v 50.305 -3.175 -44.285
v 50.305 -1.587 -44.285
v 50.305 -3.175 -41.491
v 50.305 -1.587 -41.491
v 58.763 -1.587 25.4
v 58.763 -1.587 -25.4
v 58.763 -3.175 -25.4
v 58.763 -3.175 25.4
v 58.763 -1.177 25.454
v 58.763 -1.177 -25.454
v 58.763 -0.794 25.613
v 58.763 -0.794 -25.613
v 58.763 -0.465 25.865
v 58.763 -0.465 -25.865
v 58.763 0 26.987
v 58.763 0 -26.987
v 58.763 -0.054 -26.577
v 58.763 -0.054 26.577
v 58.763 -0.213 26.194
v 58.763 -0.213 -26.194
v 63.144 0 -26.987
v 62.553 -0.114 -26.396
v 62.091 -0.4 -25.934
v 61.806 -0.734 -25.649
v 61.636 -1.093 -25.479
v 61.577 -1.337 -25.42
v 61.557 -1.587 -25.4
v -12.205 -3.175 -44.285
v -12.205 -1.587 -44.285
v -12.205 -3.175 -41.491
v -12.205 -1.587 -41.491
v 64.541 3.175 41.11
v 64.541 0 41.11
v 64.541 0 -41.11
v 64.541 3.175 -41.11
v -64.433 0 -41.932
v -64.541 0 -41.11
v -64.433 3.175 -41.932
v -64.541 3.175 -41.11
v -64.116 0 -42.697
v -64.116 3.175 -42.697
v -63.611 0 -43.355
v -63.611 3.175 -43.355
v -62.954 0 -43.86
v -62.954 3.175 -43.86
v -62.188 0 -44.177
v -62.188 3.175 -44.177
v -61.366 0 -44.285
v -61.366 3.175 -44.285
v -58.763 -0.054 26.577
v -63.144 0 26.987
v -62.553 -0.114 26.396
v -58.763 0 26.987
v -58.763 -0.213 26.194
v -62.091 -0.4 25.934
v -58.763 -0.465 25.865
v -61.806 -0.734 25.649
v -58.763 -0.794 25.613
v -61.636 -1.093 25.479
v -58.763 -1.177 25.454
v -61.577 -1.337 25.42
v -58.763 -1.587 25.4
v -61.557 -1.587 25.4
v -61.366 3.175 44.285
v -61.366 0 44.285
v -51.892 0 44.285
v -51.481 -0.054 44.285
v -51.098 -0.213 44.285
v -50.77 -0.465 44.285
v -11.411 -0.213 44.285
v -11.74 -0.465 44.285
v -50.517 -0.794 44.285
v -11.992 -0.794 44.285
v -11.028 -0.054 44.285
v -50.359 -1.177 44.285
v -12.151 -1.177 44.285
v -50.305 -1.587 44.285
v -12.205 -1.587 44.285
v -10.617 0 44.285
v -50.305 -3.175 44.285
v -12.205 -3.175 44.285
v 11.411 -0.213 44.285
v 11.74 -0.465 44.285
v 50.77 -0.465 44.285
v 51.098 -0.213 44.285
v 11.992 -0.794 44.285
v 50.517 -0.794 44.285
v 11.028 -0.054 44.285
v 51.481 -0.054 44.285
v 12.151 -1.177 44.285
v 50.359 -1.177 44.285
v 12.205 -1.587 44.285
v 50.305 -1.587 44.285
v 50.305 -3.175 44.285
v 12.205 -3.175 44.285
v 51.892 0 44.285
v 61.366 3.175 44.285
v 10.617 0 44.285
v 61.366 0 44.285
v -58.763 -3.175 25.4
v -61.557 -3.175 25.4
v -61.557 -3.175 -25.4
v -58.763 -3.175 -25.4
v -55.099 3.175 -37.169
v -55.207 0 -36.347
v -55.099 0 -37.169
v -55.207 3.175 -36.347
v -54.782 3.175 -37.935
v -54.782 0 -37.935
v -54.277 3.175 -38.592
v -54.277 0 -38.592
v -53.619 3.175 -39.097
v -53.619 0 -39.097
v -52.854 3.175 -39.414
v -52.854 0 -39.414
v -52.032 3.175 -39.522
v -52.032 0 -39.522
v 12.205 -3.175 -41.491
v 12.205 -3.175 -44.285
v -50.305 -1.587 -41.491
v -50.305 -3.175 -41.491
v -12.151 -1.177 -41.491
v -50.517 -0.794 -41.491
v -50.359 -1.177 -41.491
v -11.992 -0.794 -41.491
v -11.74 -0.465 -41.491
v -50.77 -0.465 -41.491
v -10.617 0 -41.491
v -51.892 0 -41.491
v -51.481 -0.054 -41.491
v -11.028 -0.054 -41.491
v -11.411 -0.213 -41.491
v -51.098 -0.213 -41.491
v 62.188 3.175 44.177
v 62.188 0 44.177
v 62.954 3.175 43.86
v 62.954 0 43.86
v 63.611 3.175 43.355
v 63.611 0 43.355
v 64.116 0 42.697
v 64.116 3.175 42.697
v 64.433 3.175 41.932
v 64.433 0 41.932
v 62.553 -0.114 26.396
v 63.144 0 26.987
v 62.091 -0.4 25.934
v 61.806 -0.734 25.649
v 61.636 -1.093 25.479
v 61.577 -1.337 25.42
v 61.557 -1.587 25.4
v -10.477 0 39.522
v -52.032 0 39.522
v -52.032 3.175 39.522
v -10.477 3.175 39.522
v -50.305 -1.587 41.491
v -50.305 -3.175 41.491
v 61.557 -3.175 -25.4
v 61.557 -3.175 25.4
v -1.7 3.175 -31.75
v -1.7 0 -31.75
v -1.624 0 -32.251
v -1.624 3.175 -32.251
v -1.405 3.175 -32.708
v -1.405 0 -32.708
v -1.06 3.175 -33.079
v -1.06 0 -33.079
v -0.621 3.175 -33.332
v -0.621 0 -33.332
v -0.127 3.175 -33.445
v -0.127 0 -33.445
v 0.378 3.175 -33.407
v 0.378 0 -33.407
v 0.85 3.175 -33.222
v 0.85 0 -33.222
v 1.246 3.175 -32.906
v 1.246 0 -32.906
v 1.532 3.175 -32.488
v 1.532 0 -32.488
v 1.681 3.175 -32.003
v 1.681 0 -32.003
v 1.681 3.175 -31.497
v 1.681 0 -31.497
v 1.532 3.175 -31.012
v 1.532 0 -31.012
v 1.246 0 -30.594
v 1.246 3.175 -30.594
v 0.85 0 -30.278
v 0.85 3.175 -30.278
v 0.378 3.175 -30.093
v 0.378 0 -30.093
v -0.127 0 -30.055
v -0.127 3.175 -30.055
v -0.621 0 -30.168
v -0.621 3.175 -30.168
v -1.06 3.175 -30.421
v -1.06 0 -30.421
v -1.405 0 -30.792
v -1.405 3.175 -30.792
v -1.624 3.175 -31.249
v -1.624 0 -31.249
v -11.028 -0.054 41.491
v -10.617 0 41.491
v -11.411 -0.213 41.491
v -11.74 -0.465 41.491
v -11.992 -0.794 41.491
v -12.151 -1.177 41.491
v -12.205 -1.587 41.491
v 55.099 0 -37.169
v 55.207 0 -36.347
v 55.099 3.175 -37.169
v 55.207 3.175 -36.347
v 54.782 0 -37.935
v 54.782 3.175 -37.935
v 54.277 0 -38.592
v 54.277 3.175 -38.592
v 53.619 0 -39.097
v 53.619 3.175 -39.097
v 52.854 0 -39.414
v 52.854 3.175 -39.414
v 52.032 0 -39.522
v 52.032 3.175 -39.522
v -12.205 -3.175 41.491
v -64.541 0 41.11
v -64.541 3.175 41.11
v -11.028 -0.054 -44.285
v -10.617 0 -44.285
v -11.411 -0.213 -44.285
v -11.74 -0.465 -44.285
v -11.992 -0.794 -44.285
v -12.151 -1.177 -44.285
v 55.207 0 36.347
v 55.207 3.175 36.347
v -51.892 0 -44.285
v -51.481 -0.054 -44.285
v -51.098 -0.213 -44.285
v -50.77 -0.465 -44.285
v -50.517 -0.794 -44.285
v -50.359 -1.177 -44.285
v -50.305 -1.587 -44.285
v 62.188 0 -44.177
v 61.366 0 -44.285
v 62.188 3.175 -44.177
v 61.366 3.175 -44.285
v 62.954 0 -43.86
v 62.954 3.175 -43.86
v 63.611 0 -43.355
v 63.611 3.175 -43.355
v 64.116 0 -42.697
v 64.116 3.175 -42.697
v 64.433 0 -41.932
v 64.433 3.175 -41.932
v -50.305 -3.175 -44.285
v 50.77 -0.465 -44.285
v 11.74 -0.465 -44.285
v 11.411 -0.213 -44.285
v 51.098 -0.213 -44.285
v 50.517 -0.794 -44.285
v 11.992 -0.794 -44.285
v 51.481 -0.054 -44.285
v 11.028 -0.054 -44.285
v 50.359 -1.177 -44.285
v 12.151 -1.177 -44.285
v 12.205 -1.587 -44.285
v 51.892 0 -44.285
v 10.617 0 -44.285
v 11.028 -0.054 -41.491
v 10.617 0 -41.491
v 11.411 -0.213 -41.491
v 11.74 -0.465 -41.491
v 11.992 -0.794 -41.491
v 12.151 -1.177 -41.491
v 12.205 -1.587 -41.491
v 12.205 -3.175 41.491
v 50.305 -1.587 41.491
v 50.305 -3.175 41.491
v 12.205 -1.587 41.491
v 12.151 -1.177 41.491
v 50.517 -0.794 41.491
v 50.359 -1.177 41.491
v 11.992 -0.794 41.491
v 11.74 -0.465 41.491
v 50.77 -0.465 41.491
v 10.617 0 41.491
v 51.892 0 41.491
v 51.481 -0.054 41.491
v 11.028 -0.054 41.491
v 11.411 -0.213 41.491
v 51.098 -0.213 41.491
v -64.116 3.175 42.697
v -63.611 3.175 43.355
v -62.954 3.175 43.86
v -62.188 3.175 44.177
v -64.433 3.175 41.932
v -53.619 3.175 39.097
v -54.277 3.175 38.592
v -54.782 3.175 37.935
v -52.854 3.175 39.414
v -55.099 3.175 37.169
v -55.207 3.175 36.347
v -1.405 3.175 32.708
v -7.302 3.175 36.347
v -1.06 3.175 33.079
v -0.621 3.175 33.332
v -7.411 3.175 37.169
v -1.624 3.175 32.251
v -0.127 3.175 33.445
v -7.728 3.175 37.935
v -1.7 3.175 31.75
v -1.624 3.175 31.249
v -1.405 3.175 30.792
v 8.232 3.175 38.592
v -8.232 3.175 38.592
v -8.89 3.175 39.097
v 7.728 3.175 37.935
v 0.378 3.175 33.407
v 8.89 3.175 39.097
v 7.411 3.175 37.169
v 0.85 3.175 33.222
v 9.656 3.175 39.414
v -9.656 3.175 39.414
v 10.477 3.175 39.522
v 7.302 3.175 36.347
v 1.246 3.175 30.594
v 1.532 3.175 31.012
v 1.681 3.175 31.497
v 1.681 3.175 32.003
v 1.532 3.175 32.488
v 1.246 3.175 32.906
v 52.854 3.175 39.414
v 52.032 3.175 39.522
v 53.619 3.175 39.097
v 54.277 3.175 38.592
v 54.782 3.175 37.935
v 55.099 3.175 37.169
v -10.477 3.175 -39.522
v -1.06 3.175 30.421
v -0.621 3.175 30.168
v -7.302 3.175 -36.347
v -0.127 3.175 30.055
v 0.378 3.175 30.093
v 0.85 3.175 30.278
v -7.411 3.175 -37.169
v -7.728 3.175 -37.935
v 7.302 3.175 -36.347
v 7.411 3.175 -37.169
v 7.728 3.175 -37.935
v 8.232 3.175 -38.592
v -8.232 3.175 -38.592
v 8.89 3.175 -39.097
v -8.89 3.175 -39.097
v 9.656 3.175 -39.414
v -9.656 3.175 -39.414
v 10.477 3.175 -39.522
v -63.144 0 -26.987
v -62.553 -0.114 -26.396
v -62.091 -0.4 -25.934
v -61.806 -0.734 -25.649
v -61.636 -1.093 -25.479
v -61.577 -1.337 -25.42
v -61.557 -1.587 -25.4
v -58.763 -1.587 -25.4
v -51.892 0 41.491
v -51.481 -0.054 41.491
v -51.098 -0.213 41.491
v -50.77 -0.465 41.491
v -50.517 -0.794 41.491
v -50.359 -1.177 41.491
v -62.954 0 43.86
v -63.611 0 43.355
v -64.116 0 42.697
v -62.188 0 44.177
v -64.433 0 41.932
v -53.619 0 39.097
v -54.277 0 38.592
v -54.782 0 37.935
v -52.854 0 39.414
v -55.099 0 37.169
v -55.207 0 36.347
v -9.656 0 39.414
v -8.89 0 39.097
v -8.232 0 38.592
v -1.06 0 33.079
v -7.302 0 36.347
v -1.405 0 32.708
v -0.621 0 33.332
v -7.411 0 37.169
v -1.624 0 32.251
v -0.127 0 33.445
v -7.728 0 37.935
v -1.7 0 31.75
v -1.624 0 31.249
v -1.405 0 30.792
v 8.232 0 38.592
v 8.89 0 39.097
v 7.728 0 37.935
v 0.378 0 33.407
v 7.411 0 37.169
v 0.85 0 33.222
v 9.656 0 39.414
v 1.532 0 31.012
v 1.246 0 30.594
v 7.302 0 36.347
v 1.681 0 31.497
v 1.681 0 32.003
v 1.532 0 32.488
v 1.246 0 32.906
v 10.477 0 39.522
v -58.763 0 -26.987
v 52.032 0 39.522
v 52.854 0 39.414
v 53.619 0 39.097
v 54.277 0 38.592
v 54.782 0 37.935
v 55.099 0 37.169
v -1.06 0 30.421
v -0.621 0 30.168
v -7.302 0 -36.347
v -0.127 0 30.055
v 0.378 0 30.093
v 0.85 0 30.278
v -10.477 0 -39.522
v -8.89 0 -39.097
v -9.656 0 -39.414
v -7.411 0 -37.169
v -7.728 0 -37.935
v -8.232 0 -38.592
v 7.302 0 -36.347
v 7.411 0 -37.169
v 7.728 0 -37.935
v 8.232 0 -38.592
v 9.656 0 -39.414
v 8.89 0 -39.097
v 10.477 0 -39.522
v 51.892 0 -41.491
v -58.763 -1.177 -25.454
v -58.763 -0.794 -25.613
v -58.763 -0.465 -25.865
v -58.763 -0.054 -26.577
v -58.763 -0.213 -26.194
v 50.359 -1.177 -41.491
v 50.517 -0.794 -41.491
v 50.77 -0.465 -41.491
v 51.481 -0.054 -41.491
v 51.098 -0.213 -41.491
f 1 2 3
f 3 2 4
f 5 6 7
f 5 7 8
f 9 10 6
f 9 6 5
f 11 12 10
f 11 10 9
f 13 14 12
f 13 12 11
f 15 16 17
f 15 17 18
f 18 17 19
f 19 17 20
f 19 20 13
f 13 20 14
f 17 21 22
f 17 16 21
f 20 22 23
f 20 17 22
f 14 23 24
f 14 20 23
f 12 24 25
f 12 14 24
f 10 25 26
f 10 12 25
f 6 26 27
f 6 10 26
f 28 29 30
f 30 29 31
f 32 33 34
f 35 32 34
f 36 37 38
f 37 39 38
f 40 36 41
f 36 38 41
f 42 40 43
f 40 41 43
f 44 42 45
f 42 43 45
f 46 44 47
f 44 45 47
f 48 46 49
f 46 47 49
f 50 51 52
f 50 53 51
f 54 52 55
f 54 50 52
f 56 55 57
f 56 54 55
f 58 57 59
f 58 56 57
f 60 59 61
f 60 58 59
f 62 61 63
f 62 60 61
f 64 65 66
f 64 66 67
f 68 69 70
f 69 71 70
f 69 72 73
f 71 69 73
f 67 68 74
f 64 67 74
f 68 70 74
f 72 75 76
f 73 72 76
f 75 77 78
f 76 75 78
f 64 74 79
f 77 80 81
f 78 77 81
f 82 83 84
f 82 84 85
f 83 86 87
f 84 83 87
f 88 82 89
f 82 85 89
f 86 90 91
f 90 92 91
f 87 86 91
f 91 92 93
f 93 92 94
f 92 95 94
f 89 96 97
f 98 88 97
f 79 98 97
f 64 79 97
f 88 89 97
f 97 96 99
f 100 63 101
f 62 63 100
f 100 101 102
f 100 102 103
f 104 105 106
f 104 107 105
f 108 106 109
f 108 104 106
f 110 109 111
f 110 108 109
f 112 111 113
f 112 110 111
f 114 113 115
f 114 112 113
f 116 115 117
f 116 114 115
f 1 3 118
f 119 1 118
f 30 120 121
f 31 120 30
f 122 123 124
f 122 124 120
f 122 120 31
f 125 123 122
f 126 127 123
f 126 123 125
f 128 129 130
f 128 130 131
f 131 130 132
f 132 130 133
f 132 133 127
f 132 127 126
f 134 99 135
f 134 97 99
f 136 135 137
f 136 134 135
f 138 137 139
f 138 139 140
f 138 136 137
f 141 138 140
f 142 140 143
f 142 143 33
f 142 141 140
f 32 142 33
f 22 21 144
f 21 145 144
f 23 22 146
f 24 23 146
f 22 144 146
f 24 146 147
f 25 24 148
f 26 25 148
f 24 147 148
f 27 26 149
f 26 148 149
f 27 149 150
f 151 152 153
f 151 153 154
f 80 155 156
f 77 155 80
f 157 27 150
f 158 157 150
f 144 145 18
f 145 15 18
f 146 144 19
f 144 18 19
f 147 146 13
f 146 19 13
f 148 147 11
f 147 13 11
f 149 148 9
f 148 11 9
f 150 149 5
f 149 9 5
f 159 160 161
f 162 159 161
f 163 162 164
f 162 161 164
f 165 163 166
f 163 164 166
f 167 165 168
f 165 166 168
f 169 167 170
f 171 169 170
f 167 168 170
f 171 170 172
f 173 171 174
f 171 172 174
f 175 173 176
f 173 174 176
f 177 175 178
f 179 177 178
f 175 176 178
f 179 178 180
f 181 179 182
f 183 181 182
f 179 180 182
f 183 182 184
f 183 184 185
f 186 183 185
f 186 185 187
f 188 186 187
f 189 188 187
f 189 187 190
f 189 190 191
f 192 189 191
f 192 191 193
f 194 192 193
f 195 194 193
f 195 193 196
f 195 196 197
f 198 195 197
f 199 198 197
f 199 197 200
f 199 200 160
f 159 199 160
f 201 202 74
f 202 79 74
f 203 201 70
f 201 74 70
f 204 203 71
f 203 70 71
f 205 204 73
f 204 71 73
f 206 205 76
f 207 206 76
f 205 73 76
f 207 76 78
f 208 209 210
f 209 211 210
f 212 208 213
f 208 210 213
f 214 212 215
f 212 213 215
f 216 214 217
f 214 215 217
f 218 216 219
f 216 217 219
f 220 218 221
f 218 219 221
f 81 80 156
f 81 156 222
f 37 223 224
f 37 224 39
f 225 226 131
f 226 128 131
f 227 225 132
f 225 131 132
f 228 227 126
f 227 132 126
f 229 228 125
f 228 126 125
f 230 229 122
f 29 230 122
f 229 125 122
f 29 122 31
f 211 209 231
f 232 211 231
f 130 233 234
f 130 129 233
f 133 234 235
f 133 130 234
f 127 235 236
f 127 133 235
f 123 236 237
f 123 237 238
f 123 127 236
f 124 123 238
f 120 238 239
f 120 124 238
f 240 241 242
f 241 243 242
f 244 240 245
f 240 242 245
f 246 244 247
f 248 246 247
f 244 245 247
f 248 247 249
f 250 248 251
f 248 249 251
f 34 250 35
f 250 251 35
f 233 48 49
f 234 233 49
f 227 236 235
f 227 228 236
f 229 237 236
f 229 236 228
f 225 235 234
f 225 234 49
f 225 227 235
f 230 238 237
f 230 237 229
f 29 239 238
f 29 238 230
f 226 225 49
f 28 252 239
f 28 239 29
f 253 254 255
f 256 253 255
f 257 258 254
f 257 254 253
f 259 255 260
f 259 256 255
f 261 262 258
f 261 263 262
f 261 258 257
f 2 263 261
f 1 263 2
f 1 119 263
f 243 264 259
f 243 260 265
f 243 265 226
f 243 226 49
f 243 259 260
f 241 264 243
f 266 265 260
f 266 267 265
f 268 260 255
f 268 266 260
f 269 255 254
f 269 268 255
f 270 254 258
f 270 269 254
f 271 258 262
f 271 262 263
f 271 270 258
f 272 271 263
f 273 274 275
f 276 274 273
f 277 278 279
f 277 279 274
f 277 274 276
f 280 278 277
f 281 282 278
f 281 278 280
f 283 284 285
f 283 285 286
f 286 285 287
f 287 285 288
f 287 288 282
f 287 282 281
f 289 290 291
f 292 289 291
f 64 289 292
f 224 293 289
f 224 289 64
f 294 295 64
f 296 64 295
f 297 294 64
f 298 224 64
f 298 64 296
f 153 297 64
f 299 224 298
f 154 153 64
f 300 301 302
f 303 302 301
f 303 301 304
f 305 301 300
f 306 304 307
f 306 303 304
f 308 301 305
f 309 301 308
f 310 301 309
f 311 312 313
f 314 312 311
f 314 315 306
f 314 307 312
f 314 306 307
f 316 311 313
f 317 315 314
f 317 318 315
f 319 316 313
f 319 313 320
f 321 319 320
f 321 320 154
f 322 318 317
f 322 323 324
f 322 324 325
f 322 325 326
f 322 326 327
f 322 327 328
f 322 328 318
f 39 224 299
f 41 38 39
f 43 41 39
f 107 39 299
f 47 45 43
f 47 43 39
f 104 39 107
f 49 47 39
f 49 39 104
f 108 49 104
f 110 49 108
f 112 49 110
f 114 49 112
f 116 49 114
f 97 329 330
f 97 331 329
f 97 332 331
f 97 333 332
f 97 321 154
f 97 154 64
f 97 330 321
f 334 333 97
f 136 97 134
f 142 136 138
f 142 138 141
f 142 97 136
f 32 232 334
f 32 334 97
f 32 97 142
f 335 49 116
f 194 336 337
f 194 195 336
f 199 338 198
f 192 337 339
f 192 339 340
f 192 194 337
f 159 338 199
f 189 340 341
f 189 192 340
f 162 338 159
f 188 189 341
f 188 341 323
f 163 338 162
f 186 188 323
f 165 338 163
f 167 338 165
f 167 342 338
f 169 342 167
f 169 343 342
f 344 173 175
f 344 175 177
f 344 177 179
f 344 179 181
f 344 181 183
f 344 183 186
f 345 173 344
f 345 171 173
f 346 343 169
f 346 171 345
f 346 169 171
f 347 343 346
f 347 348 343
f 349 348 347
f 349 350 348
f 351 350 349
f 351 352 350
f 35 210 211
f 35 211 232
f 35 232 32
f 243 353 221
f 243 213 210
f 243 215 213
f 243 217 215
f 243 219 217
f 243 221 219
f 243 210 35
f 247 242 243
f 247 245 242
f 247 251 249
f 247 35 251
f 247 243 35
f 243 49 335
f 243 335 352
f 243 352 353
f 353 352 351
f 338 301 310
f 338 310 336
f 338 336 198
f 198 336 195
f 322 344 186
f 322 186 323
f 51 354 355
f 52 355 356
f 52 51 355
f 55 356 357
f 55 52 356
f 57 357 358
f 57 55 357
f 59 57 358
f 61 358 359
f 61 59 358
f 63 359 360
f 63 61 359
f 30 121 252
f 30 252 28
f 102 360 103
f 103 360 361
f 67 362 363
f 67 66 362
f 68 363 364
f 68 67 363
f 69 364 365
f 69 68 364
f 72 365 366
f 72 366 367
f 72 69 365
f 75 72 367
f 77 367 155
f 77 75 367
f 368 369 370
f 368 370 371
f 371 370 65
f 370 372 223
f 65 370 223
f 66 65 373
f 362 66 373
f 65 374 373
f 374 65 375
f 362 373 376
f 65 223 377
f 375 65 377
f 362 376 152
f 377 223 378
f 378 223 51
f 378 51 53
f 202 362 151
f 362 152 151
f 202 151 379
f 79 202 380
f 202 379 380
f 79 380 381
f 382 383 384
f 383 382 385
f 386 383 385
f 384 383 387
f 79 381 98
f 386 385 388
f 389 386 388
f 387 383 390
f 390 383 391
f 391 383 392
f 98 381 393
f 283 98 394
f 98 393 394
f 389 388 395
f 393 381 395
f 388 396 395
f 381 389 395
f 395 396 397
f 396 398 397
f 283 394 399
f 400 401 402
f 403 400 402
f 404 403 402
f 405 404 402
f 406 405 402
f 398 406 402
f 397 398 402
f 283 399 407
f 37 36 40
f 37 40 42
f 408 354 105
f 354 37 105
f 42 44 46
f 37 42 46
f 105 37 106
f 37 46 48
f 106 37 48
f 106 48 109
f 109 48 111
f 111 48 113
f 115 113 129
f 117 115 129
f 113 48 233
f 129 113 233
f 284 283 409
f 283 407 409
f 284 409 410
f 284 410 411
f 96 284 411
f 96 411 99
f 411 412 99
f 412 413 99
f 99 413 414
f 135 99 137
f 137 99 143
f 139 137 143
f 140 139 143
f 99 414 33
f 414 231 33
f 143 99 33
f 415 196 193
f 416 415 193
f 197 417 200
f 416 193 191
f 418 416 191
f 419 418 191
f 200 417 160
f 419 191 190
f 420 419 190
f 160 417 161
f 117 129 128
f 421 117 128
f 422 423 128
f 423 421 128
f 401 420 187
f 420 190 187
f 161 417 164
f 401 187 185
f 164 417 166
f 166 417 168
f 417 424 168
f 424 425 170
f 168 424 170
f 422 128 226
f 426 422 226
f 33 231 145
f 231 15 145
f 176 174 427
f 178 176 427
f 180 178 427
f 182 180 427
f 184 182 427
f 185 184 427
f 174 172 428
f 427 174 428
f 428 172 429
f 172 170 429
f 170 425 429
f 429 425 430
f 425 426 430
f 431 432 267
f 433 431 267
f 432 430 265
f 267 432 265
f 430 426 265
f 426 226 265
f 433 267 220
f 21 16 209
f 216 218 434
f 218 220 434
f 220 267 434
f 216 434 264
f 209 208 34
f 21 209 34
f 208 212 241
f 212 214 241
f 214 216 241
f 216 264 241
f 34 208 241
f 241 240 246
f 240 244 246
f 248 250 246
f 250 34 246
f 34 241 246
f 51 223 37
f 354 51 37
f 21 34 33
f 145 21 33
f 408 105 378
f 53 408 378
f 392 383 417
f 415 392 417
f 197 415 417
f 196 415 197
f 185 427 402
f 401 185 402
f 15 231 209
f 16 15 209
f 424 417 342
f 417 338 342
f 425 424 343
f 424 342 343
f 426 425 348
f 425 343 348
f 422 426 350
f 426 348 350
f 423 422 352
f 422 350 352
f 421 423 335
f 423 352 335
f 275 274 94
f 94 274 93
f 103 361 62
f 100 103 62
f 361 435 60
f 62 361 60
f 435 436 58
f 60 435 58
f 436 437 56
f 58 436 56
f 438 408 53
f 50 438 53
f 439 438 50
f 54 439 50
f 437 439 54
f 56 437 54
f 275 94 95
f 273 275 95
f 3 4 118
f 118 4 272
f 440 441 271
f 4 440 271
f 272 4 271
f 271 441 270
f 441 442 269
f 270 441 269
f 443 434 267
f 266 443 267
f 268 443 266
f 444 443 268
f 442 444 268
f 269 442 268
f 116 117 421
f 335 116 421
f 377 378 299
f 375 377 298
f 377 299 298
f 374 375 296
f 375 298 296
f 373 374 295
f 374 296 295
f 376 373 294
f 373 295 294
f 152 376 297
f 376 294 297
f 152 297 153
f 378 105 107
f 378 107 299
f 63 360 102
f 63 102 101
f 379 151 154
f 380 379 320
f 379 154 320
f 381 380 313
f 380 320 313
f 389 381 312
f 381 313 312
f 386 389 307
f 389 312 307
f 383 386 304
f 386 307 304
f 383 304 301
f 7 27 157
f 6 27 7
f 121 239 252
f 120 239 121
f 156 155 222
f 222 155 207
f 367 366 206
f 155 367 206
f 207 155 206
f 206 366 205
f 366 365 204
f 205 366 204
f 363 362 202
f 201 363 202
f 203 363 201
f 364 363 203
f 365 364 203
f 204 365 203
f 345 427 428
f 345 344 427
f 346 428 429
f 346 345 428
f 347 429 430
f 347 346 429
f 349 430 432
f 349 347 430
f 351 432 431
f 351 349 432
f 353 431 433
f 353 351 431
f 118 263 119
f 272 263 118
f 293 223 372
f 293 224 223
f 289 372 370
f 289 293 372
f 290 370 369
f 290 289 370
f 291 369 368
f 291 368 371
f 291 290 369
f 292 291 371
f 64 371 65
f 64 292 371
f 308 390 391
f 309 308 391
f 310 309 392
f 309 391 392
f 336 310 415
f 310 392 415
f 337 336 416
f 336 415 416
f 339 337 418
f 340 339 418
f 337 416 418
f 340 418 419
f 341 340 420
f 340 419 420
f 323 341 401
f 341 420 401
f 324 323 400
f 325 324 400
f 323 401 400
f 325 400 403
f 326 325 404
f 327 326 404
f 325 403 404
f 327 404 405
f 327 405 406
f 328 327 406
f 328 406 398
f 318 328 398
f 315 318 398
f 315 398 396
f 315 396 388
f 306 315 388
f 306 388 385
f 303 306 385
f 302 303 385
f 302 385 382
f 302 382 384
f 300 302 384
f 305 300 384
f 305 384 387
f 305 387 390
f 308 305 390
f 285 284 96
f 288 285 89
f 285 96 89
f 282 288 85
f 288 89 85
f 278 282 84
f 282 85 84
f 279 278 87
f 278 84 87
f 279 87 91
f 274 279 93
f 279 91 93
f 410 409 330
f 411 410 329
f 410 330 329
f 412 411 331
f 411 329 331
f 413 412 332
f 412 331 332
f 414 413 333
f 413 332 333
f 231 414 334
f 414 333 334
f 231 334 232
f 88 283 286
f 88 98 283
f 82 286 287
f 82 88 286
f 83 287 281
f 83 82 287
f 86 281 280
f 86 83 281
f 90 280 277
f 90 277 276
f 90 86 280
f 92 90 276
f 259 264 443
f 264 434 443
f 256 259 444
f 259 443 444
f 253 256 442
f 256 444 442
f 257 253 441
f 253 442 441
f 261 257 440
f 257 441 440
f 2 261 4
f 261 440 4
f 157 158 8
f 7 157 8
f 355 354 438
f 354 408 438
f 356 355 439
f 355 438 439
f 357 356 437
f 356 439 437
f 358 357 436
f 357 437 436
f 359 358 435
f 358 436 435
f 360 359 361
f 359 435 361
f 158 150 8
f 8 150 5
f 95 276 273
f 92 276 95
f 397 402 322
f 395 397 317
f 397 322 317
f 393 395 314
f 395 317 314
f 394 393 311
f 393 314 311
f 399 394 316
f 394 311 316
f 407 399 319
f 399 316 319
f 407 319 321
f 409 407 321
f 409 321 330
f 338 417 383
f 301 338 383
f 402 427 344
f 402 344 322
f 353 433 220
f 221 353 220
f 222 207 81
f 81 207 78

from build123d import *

# Parameters (mm, degrees)
SKETCH1_W            = 129.0828
SKETCH1_H            = 88.5698
BOSS_EXTRUDE1_DEPTH  = 3.175
SKETCH3_W            = 47.9044
SKETCH3_H            = 79.0448
CUT_EXTRUDE1_DEPTH   = 4.175
FILLET1_R            = 3.175
SKETCH5_W            = 38.1
SKETCH5_H            = 2.794
SKETCH5_W_2          = 2.794
SKETCH5_H_2          = 50.8
BOSS_EXTRUDE2_DEPTH  = 3.175
FILLET2_R            = 1.5875
FILLET2_OF_MIRROR1_R = 1.5875
M3_CLEARANCE_HOLE1_D = 3.4


with BuildPart() as part:
    # Sketch1 → Boss-Extrude1 (new body)
    with BuildSketch(Plane(origin=(0, 0, 0), x_dir=(1, 0, 0), z_dir=(0, 1, 0))):
        Rectangle(SKETCH1_W, SKETCH1_H)
    extrude(amount=BOSS_EXTRUDE1_DEPTH)

    # Sketch3 → Cut-Extrude1 (cut, through all)
    with BuildSketch(Plane.XZ):
        with Locations((-31.2547, 0)):
            Rectangle(SKETCH3_W, SKETCH3_H)
        with Locations((31.2547, 0)):
            Rectangle(SKETCH3_W, SKETCH3_H)
    extrude(amount=-CUT_EXTRUDE1_DEPTH, mode=Mode.SUBTRACT)

    # Fillet1
    fillet1_edges = [part.edges().sort_by_distance(p)[0] for p in [
        (-7.3025, 1.5875, -39.5224),
        (-55.2069, 1.5875, -39.5224),
        (-55.2069, 1.5875, 39.5224),
        (-7.3025, 1.5875, 39.5224),
        (55.2069, 1.5875, -39.5224),
        (7.3025, 1.5875, -39.5224),
        (7.3025, 1.5875, 39.5224),
        (55.2069, 1.5875, 39.5224),
        (-64.5414, 1.5875, -44.2849),
        (64.5414, 1.5875, -44.2849),
        (64.5414, 1.5875, 44.2849),
        (-64.5414, 1.5875, 44.2849),
    ]]
    fillet(fillet1_edges, radius=FILLET1_R)

    # Sketch5 → Boss-Extrude2 (add)
    with BuildSketch(Plane.XZ):
        with Locations((-31.2547, 42.8879)):
            Rectangle(SKETCH5_W, SKETCH5_H)
        with Locations((-60.1599, 0)):
            Rectangle(SKETCH5_W_2, SKETCH5_H_2)
        with Locations((-31.2547, -42.8879)):
            Rectangle(SKETCH5_W, SKETCH5_H)
    boss_extrude2 = extrude(amount=BOSS_EXTRUDE2_DEPTH)

    # Fillet2
    fillet2_edges = [part.edges().sort_by_distance(p)[0] for p in [
        (-50.3047, 0, 42.8879),
        (-12.2047, 0, 42.8879),
        (-61.5569, 0, 0),
        (-60.1599, 0, -25.4),
        (-60.1599, 0, 25.4),
        (-50.3047, 0, -42.8879),
        (-12.2047, 0, -42.8879),
    ]]
    fillet(fillet2_edges, radius=FILLET2_R)

    # Mirror1: Boss-Extrude2 across plane
    add(boss_extrude2.mirror(Plane(origin=(0, 0, 0), x_dir=(0, 0, 1), z_dir=(1, 0, 0))))

    # Fillet2 of Mirror1
    fillet2_of_mirror1_edges = [part.edges().sort_by_distance(p)[0] for p in [
        (50.3047, 0, 42.8879),
        (12.2047, 0, 42.8879),
        (61.5569, 0, 0),
        (60.1599, 0, -25.4),
        (60.1599, 0, 25.4),
        (50.3047, 0, -42.8879),
        (12.2047, 0, -42.8879),
    ]]
    fillet(fillet2_of_mirror1_edges, radius=FILLET2_OF_MIRROR1_R)

    # M3 Clearance Hole1 (through all)
    with Locations(Plane(origin=(0, 3.175, 0), x_dir=(1, 0, 0), z_dir=(0, 1, 0))):
        with Locations((0, 31.75), (0, -31.75)):
            Hole(M3_CLEARANCE_HOLE1_D / 2)


solid = part.part
